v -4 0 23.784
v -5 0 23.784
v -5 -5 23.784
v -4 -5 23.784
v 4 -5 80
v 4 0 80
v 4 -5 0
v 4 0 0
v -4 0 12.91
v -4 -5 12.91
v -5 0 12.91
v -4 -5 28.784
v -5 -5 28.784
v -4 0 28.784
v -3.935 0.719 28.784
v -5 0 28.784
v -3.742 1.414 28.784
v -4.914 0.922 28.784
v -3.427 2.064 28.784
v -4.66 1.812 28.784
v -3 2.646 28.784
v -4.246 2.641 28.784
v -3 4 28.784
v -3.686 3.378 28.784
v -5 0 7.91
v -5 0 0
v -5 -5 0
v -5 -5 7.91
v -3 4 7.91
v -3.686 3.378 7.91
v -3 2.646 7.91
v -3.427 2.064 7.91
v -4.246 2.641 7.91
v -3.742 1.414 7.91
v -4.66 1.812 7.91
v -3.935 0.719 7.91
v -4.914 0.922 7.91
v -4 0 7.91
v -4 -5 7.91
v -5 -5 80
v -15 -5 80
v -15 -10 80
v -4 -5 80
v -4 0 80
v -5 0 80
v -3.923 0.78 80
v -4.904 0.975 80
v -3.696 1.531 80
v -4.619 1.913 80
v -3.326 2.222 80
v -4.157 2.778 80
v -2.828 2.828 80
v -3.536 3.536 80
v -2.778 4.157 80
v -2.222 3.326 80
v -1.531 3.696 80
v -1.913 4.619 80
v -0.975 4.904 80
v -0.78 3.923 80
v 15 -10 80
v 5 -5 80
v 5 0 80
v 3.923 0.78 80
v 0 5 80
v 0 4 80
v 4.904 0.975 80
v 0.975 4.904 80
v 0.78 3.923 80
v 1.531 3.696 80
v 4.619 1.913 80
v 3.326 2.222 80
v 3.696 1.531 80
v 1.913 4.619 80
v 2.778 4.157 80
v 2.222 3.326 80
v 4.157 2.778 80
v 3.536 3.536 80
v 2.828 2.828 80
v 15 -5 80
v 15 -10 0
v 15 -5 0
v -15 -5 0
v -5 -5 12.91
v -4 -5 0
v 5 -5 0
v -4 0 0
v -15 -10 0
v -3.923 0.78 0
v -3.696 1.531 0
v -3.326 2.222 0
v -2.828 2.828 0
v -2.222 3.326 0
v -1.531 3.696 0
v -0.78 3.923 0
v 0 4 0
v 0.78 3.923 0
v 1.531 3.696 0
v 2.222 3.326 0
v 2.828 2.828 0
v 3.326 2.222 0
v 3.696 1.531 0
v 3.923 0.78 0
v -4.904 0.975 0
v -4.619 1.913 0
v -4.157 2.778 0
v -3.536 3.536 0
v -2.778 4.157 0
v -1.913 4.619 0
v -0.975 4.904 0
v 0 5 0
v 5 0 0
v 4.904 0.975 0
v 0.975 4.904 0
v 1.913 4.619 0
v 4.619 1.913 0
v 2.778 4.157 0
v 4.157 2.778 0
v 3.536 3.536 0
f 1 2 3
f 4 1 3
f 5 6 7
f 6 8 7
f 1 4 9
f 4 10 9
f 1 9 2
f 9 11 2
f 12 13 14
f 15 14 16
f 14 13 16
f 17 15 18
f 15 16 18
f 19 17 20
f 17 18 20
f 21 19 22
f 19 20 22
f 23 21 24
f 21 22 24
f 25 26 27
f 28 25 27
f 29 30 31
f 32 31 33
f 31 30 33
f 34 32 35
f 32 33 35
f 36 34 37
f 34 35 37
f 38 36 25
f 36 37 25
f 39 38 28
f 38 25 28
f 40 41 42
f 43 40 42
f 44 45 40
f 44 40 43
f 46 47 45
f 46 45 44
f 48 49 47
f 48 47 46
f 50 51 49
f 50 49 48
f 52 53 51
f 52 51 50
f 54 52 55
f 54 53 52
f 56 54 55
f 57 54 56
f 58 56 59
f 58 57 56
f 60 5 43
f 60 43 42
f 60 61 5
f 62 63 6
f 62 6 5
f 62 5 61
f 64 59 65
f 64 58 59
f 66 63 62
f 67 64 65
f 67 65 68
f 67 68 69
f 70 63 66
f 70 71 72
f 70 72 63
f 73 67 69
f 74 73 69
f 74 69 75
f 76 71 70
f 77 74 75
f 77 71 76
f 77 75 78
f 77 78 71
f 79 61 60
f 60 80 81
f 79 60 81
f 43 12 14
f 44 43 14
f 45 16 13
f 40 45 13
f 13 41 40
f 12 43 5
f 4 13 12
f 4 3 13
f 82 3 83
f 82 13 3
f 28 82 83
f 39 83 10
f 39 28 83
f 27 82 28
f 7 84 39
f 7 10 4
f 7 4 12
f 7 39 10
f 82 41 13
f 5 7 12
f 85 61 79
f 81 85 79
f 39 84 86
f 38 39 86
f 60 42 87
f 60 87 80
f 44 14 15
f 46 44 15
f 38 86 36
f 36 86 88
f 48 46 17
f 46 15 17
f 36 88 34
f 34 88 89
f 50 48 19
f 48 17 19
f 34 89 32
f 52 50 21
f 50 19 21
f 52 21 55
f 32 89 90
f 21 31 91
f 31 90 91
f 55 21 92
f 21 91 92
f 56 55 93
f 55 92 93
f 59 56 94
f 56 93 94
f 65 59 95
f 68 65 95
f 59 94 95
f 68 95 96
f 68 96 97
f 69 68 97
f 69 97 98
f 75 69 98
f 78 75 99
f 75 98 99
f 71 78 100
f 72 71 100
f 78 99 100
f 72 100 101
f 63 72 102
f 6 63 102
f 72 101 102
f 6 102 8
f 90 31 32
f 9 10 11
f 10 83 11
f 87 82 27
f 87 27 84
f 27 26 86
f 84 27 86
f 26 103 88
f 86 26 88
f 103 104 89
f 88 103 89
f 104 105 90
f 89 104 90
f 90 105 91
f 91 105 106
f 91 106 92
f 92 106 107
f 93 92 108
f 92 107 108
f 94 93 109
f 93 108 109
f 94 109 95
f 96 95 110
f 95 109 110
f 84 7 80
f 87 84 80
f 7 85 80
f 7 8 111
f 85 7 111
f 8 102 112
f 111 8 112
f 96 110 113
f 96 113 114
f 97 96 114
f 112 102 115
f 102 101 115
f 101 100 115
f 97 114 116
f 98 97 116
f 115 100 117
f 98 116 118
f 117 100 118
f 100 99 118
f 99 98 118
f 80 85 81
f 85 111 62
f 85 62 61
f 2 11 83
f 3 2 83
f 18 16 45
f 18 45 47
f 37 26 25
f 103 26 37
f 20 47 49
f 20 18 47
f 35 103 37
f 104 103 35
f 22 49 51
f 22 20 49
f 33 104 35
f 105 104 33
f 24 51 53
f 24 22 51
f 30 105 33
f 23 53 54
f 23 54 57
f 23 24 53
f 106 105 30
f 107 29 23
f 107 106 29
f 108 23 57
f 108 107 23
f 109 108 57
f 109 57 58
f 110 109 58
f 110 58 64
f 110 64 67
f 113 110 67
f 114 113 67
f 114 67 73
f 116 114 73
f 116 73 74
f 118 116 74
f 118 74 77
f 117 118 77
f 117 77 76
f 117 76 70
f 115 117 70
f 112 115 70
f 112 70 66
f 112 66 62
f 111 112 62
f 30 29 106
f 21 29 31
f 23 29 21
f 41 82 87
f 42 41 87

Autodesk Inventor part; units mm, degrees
ref_plane "YZ Plane" through (0, 0, 0) normal (1, 0, 0) x (0, 1, 0)
ref_plane "XZ Plane" through (0, 0, 0) normal (0, 1, 0) x (-1, 0, 0)
ref_plane "XY Plane" through (0, 0, 0) normal (0, 0, 1) x (1, 0, 0)
sketch "Эскиз9" plane through (0, 0, 0) normal (0, 0, 1) x (1, 0, 0)
  line L0 (-15, -5) -> (-5, -5)
  line L1 (0, -5) -> (-5, -5)
  line L2 (5, -5) -> (0, -5)
  line L3 (5, -5) -> (15, -5)
  line L4 (-15, -10) -> (15, -10)
  line L5 (-15, -5) -> (-15, -10)
  line L6 (-15, -5) -> (15, -5)
  line L7 (15, -10) -> (15, -5)
  line L8 (15, -10) -> (-15, -10)
  line L9 (-15, -5) -> (-15, -10)
extrude "Выдавливание9" [suppressed]
sketch "Эскиз8" plane through (0, 0, 0) normal (0, 0, 1) x (1, 0, 0)
  line L0 (0, 5) -> (0, -5)
  line L1 (-5, 0) -> (5, 0)
  arc A0 (5, 0) -> (-5, 0) centre (0, 0) ccw
  line L2 (-5, 0) -> (-5, -5)
  line L3 (5, 0) -> (5, -5)
  line L4 (0, -5) -> (-4, -5)
  line L5 (4, -5) -> (0, -5)
  line L6 (-4, -5) -> (-4, 0)
  arc A1 (4, 0) -> (-4, 0) centre (0, 0) ccw
  line L7 (4, 0) -> (4, -5)
  line L8 (-5, -5) -> (-4, -5)
  line L9 (4, -5) -> (5, -5)
  line L10 (-15, -5) -> (-5, -5)
  line L11 (0, -5) -> (-5, -5)
  line L12 (5, -5) -> (0, -5)
  line L13 (5, -5) -> (15, -5)
  line L14 (-15, -10) -> (15, -10)
  line L15 (-15, -5) -> (-15, -10)
  line L16 (-15, -5) -> (15, -5)
  line L17 (15, -10) -> (15, -5)
  line L18 (15, -10) -> (-15, -10)
  line L19 (-15, -5) -> (-15, -10)
  dimension "d32" = 10
  dimension "d33" = 5
  dimension "d34" = 5
  dimension "d52" = 1
extrude "Выдавливание14" add sketch "Эскиз8" along normal blind 80
sketch "Эскиз10" plane through (-5, -5, 0) normal (-1, 0, 0) x (0, 0, 1)
  line L0 (0, 10) -> (80, 10) projected
  line L1 (0, 0) -> (80, 0) projected
  line L2 (0, 5) -> (80, 5) projected
  line L3 (7.9097, 10) -> (7.9097, 0)
  line L4 (0, 0) -> (80, 0) projected
  line L5 (12.9097, 0) -> (12.9097, 5)
  line L6 (7.9097, 0) -> (12.9097, 0)
  line L7 (12.9097, 5) -> (23.7841, 5)
  line L8 (23.7841, 0) -> (12.9097, 0)
  line L9 (23.7841, 5) -> (23.7841, 0)
  line L10 (7.9097, 10) -> (28.7841, 10)
  line L11 (28.7841, 0) -> (28.7841, 10)
  line L12 (28.7841, 0) -> (23.7841, 0)
  dimension "d64" = 5
  dimension "d65" = 5
extrude "Выдавливание15" cut sketch "Эскиз10" against normal blind 2 contours L0 L11 L2 L3 | L2 L5 L1 L3 | L11 L1 L9 L2
extrude "Выдавливание16" cut sketch "Эскиз8" along normal blind 80 contours A1 L1 L0 | L0 L1 A1 | L1 L7 L5 L0 | L0 L4 L6 L1
equation "\"d32\" = diametr_"
equation "\"d64\" = diametr_ruchka_"
equation "\"d65\" = diametr_ruchka_"
equation "\"diametr_\" = 10"
equation "\"diametr_ruchka_\" = 5"
properties part number "lw_5_корпус"
